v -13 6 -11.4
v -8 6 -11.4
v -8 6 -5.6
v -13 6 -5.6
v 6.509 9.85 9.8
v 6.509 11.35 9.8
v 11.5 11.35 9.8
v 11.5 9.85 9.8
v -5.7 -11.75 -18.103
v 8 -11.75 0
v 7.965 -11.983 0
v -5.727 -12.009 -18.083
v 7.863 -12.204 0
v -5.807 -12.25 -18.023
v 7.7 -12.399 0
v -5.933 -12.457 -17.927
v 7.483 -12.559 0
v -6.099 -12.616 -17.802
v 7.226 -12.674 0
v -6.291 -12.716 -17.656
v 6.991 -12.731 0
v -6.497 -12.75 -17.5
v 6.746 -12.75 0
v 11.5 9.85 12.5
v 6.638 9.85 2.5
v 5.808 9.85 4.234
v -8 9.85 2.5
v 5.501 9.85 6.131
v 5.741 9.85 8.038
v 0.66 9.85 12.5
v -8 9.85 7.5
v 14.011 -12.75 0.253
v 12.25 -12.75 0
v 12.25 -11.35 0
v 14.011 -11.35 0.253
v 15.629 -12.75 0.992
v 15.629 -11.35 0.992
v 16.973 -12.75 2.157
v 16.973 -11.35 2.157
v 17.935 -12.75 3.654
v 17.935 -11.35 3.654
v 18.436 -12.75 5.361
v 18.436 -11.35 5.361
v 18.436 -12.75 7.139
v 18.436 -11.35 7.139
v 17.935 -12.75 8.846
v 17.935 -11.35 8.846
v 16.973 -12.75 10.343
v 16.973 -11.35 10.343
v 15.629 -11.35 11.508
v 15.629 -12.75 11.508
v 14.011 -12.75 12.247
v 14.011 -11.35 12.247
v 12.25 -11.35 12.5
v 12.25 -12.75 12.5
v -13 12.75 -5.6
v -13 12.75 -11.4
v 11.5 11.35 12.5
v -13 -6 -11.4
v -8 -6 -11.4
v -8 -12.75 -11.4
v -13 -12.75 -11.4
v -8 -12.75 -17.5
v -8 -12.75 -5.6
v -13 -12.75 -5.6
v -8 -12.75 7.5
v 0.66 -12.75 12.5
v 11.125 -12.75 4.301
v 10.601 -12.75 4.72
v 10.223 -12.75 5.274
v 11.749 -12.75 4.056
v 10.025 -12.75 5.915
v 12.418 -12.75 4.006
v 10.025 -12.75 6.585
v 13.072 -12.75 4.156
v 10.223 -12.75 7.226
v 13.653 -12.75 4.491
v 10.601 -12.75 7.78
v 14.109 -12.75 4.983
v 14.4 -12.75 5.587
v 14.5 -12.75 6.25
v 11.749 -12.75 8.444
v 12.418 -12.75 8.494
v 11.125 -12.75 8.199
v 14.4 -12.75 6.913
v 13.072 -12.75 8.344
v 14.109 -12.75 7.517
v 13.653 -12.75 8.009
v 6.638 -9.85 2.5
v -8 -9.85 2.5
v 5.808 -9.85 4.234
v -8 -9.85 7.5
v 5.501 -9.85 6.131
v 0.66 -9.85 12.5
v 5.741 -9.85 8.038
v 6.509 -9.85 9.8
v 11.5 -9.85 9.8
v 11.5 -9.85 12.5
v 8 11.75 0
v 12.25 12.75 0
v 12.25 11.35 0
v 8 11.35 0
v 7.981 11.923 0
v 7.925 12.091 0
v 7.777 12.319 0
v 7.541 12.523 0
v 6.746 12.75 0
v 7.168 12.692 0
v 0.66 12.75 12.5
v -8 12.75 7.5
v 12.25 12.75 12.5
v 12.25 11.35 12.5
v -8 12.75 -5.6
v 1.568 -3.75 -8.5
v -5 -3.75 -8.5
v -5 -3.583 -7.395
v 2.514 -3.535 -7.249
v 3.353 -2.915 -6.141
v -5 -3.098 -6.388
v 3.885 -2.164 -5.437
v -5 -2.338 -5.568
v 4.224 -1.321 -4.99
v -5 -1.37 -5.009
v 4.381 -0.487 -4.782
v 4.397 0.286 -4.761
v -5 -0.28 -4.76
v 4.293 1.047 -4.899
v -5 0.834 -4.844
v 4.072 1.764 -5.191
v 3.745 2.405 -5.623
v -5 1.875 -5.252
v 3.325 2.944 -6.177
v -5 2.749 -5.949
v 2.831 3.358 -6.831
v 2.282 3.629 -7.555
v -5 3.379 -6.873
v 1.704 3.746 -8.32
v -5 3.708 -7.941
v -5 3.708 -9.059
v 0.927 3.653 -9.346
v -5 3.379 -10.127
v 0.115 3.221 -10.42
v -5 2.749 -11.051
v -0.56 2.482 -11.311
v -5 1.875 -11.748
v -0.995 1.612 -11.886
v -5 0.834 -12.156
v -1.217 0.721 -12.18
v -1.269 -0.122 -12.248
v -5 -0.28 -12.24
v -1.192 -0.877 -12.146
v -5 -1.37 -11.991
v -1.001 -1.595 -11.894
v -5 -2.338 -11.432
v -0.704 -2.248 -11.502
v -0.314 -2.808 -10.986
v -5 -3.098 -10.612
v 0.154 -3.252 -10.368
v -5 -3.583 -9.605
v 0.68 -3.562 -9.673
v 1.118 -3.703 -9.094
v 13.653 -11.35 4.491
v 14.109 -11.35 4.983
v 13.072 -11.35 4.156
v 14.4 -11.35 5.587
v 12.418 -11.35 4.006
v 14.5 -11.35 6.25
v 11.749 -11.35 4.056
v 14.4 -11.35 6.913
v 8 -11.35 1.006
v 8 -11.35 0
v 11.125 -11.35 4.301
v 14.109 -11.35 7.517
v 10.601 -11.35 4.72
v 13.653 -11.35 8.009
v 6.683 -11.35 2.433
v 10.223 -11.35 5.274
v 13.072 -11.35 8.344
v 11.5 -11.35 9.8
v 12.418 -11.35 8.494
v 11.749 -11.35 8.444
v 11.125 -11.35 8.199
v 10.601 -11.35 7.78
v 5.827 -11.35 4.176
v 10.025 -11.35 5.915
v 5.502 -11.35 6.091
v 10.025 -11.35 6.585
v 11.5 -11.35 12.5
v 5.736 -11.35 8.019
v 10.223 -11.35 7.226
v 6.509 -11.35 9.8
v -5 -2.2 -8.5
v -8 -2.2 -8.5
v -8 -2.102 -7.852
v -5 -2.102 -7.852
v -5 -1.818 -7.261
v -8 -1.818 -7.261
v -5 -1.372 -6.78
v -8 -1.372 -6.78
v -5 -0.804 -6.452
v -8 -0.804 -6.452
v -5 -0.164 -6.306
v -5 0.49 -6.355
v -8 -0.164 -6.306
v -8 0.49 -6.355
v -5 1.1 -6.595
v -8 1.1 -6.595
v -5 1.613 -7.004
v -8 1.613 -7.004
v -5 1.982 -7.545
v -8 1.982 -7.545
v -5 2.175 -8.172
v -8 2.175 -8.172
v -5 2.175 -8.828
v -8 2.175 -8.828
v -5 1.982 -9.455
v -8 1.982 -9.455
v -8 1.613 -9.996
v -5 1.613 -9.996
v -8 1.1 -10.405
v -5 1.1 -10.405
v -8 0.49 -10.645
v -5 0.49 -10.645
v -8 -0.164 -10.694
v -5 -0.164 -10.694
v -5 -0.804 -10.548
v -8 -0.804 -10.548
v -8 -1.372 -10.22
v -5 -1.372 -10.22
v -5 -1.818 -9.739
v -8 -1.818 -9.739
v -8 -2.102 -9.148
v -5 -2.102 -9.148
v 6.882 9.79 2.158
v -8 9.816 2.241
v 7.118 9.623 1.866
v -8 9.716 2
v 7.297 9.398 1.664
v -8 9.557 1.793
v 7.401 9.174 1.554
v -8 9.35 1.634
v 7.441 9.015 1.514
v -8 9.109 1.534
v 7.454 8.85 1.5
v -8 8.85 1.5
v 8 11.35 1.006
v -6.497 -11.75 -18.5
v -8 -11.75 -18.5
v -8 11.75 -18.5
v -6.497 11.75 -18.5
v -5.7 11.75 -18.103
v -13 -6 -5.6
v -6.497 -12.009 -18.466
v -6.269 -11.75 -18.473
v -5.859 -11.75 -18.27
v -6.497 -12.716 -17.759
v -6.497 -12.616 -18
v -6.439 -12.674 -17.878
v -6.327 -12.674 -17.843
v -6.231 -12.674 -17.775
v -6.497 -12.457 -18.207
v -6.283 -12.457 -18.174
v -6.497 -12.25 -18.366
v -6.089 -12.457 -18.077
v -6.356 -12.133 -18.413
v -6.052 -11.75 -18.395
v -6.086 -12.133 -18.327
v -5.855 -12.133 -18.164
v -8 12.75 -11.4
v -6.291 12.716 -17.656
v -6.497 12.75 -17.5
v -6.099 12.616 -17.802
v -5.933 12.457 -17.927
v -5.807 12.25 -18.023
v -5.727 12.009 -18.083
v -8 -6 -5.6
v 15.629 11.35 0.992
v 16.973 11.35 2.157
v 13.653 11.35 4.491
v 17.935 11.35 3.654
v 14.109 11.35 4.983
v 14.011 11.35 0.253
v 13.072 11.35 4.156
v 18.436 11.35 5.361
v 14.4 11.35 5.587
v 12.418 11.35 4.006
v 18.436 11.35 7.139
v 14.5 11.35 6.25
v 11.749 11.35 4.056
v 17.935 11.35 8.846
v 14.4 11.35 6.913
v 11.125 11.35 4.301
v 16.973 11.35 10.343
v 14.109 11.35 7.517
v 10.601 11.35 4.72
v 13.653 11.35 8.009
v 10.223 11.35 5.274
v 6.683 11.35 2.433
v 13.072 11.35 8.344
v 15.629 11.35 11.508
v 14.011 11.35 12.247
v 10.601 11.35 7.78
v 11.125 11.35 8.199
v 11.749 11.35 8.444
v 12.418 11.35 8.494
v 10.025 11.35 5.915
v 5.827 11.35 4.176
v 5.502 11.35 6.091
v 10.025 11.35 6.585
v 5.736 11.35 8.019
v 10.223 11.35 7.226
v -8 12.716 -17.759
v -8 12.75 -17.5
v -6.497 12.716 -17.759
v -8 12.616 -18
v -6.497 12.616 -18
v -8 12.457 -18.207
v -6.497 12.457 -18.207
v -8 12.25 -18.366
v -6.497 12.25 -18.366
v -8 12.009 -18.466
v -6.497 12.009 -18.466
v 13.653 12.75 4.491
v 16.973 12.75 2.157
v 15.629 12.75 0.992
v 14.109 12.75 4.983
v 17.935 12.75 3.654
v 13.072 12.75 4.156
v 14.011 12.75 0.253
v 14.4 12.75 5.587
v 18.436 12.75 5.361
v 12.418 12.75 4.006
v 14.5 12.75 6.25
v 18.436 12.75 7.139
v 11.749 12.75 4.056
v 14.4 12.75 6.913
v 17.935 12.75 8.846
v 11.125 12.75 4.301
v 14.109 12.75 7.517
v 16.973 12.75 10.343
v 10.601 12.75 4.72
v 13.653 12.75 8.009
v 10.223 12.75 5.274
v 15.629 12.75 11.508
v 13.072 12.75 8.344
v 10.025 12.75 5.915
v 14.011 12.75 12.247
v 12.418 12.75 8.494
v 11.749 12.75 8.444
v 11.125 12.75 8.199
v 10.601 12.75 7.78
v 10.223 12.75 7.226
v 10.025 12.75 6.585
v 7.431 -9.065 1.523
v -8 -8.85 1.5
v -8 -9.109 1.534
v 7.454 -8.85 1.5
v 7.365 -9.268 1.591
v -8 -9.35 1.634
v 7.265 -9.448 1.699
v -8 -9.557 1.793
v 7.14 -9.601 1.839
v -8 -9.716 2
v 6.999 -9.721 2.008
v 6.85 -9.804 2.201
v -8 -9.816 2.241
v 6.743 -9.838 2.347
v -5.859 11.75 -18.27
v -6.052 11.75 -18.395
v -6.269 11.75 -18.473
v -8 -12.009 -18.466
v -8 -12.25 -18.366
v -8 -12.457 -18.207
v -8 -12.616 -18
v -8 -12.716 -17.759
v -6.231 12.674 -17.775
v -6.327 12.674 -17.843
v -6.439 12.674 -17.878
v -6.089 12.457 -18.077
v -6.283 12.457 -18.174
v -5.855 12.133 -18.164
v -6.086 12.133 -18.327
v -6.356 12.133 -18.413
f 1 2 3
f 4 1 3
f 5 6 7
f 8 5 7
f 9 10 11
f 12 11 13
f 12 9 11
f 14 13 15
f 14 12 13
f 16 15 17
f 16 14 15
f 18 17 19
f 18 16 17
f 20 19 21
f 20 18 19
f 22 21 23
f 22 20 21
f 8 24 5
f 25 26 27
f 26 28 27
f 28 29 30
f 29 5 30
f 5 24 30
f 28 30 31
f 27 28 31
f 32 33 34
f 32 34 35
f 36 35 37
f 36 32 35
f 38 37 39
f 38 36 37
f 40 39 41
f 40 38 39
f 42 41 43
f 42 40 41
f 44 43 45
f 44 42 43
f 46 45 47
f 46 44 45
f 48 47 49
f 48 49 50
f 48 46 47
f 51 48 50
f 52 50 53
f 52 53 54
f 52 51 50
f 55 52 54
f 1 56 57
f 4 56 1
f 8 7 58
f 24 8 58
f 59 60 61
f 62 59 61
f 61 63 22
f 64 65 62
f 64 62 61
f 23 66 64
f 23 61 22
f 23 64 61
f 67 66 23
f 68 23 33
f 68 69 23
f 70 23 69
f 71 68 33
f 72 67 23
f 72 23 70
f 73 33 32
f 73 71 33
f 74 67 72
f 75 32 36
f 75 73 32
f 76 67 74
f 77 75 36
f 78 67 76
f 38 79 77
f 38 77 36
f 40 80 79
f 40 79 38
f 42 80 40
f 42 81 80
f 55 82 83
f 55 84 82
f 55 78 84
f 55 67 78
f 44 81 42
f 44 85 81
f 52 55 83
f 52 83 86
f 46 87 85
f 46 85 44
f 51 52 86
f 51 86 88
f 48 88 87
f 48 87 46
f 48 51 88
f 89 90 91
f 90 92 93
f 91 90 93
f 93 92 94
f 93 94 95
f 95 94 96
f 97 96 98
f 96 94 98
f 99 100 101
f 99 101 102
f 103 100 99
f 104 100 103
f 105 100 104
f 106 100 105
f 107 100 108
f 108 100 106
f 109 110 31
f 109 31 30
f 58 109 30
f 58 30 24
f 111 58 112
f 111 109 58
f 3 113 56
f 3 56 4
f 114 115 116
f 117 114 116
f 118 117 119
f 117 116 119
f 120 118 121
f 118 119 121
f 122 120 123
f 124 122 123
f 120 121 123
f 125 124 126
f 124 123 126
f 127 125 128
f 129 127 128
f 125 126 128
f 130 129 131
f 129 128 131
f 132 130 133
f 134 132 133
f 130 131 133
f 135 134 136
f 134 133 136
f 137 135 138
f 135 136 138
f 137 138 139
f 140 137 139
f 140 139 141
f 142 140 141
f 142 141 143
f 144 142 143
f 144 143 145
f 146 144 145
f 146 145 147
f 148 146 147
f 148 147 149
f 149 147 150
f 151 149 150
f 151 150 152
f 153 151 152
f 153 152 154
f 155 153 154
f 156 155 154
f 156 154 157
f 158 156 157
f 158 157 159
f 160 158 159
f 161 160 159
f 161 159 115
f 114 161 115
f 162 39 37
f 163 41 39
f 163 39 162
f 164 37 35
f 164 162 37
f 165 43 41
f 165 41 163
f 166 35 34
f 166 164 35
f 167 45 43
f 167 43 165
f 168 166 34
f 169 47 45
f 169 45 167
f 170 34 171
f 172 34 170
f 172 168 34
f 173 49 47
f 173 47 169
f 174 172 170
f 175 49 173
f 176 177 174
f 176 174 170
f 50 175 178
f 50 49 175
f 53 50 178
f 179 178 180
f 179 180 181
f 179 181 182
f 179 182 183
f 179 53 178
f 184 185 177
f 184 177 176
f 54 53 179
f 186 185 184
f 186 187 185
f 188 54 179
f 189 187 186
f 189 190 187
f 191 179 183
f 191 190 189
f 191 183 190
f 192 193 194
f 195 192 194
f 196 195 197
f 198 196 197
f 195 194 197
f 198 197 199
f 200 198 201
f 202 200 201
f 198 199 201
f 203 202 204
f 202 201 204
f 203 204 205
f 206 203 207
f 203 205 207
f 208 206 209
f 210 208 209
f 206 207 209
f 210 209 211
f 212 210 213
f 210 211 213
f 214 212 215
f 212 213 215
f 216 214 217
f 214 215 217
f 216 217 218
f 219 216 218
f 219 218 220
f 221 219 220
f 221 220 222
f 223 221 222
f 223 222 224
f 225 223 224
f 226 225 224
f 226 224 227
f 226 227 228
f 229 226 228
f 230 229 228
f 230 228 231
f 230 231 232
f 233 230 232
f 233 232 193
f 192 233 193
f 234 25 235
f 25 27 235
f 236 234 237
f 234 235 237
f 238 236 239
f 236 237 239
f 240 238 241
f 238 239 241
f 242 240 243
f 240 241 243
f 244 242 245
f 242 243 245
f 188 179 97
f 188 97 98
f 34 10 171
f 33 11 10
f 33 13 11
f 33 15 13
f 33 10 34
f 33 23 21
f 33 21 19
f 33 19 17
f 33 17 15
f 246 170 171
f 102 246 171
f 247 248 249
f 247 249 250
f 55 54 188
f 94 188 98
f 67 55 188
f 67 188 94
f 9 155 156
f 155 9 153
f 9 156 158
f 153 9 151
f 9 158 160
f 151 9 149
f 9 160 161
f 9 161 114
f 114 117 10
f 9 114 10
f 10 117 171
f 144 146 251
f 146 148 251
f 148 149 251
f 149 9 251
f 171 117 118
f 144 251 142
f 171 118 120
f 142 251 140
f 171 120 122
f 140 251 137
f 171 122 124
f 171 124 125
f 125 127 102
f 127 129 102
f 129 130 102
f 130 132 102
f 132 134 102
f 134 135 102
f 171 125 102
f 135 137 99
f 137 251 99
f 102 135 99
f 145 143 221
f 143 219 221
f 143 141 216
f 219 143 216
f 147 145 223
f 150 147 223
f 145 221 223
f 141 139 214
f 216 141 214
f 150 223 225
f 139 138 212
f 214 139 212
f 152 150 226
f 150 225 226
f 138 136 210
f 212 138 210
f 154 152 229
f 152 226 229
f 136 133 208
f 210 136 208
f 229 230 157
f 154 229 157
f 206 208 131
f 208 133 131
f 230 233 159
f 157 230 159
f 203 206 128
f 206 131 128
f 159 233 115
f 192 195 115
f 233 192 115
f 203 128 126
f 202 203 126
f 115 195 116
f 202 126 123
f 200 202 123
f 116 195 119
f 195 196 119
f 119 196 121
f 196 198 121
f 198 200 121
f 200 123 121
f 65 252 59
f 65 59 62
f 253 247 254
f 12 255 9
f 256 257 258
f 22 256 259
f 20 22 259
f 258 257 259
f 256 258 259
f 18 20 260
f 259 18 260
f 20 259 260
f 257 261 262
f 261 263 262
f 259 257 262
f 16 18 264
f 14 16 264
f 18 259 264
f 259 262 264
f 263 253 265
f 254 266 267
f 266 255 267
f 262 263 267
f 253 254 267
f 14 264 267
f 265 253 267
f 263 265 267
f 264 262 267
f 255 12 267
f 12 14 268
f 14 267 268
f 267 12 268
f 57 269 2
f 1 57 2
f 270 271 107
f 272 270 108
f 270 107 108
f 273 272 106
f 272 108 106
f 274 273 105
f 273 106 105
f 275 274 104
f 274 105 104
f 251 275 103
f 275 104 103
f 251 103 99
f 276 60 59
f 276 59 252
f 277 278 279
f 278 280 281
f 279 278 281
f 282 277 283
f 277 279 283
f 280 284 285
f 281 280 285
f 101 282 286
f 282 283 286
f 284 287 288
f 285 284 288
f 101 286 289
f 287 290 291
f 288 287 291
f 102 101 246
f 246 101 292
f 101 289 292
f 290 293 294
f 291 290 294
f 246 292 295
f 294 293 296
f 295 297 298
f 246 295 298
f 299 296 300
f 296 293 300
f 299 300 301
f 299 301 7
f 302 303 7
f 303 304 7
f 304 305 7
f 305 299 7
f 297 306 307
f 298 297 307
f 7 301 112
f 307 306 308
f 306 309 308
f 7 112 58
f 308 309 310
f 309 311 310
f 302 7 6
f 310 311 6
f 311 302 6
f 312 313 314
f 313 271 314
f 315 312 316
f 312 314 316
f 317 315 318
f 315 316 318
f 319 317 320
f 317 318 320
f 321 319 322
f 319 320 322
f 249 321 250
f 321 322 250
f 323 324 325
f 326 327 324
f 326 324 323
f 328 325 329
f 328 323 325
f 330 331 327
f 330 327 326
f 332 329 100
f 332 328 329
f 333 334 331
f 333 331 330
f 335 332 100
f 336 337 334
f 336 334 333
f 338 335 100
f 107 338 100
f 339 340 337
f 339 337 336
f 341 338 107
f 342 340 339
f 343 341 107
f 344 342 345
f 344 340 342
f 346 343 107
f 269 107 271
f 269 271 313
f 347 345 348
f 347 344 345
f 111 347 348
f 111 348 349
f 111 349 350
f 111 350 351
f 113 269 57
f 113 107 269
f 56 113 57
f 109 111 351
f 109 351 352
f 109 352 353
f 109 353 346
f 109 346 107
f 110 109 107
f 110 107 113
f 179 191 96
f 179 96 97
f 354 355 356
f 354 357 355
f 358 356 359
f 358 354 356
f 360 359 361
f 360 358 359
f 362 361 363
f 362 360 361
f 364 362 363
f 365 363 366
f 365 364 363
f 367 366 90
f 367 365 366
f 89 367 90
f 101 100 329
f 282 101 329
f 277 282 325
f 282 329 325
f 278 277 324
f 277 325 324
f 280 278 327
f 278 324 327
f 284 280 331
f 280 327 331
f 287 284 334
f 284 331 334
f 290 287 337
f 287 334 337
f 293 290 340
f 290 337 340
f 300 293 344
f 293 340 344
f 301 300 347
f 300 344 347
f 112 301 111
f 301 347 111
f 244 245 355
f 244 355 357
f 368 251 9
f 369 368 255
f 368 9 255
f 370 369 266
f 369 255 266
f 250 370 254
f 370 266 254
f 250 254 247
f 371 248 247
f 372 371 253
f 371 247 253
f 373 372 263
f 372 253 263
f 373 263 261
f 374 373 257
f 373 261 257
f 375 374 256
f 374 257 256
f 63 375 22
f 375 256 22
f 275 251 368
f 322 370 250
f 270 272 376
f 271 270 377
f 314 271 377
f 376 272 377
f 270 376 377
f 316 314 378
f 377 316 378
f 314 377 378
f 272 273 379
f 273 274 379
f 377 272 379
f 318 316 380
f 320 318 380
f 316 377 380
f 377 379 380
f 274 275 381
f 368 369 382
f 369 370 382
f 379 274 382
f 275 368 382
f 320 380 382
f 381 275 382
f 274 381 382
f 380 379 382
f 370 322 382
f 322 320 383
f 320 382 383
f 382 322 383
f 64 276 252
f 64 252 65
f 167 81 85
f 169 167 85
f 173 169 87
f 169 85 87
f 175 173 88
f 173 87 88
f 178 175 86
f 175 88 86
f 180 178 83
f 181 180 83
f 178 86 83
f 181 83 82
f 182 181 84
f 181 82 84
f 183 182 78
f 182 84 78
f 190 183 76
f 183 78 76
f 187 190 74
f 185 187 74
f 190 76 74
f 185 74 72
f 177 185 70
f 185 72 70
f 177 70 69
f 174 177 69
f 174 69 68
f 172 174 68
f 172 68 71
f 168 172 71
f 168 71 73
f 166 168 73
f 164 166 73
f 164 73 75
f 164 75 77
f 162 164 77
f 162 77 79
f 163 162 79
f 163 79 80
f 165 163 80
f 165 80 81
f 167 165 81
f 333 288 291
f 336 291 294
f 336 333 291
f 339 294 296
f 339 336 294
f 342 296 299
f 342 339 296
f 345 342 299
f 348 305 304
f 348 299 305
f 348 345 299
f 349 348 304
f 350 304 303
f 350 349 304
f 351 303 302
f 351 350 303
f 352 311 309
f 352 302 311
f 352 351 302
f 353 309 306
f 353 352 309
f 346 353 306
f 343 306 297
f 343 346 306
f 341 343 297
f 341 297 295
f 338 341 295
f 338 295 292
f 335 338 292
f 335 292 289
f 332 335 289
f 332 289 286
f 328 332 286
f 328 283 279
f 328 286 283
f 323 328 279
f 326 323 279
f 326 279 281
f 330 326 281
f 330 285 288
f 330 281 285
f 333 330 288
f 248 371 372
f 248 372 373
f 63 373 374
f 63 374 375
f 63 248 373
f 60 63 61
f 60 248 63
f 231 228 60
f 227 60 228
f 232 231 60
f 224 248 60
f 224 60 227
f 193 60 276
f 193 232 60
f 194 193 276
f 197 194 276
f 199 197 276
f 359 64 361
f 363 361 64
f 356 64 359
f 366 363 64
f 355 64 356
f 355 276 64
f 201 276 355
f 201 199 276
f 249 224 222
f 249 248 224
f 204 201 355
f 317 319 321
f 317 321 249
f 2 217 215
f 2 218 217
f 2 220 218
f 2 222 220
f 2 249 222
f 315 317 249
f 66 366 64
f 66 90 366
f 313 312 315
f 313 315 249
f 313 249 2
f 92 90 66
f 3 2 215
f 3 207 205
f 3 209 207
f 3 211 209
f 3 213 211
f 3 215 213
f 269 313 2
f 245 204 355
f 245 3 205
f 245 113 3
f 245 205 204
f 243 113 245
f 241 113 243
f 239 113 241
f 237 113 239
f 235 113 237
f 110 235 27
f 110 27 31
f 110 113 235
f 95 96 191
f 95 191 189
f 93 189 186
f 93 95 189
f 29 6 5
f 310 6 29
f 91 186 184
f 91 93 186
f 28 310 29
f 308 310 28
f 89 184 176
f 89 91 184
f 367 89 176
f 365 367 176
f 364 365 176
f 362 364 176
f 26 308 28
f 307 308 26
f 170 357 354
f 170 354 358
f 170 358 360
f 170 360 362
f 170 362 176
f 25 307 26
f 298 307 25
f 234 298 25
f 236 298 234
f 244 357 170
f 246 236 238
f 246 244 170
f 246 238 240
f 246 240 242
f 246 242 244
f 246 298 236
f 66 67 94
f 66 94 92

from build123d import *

# Parameters (mm, degrees)
SKETCH009_W          = 16
SKETCH009_H          = 25.5
PAD003_DEPTH         = 1.5
PAD003_DEPTH_BACK    = 18.5
POCKET006_DEPTH      = 12.751
POCKET006_DEPTH_BACK = 12.751
SKETCH010_R          = 2.25
PAD004_DEPTH         = 2.9
SKETCH011_R          = 2.25
PAD005_DEPTH         = 2.9
POCKET002_DEPTH      = 11.35
POCKET003_DEPTH      = 11.35
SKETCH015_R          = 2.2
POCKET004_DEPTH      = 26.501032
SKETCH016_R          = 3.75
POCKET005_DEPTH      = 23.501032
SKETCH017_W          = 6.75
SKETCH017_H          = 5.8
PAD006_DEPTH         = 5
FILLET001_R          = 1


with BuildPart() as part:
    # Sketch009 → Pad003 (new body, two sides)
    with BuildSketch(Plane.XY) as pad003_sk:
        Rectangle(SKETCH009_W, SKETCH009_H)
    extrude(amount=PAD003_DEPTH)
    extrude(pad003_sk.sketch, amount=-PAD003_DEPTH_BACK)

    # Sketch018 → Pocket006 (cut, two sides)
    with BuildSketch(Plane.XZ) as pocket006_sk:
        Polygon((-6, -18.5), (8, 0), (8, -18.5), align=None)
    extrude(amount=-POCKET006_DEPTH, mode=Mode.SUBTRACT)
    extrude(pocket006_sk.sketch, amount=POCKET006_DEPTH_BACK, mode=Mode.SUBTRACT)

    # Sketch010 → Pad004 (join)
    with BuildSketch(Plane.XZ.offset(12.75)):
        with BuildLine():
            ThreePointArc((12.25, 0), (18.500032, 6.25), (12.25, 12.5))
            Line((12.25, 12.5), (0.660254, 12.5))
            Line((0.660254, 12.5), (-8, 7.5))
            Line((-8, 7.5), (-8, 0))
            Line((-8, 0), (12.25, 0))
        make_face()
        with Locations((12.25, 6.25)):
            Circle(SKETCH010_R, mode=Mode.SUBTRACT)
    extrude(amount=-PAD004_DEPTH)

    # Sketch011 → Pad005 (join)
    with BuildSketch(Plane.XZ.offset(-12.75)):
        with BuildLine():
            Line((12.25, 0), (-8, 0))
            Line((-8, 0), (-8, 7.5))
            Line((-8, 7.5), (0.660254, 12.5))
            Line((0.660254, 12.5), (12.25, 12.5))
            ThreePointArc((12.25, 0), (18.500019, 6.25), (12.25, 12.5))
        make_face()
        with Locations((12.25, 6.25)):
            Circle(SKETCH011_R, mode=Mode.SUBTRACT)
    extrude(amount=PAD005_DEPTH)

    # Sketch012 → Pocket002 (cut)
    with BuildSketch(Plane.XZ.offset(11.35)):
        with BuildLine():
            Line((18.6, 12.5), (18.6, 0))
            Line((8, 0), (18.6, 0))
            Line((8, 1.005956), (8, 0))
            ThreePointArc((6.50892, 9.8), (5.594985, 5.121605), (8, 1.005956))
            Line((6.50892, 9.8), (11.5, 9.8))
            Line((11.5, 9.8), (11.5, 12.5))
            Line((11.5, 12.5), (18.6, 12.5))
        make_face()
    extrude(amount=-POCKET002_DEPTH, mode=Mode.SUBTRACT)

    # Sketch013 → Pocket003 (cut)
    with BuildSketch(Plane.XZ.offset(-11.35)):
        with BuildLine():
            Line((18.6, 12.5), (18.6, 0))
            Line((8, 0), (18.6, 0))
            Line((8, 1.005956), (8, 0))
            ThreePointArc((6.50892, 9.8), (5.594985, 5.121605), (8, 1.005956))
            Line((6.50892, 9.8), (11.5, 9.8))
            Line((11.5, 9.8), (11.5, 12.5))
            Line((11.5, 12.5), (18.6, 12.5))
        make_face()
    extrude(amount=POCKET003_DEPTH, mode=Mode.SUBTRACT)

    # Sketch015 (on DatumPlane) → Pocket004 (cut, through all)
    with BuildSketch(Plane(origin=(-8, 12.75, 0), x_dir=(0, -1, 0), z_dir=(-1, 0, 0))):
        with Locations((12.75, -8.5)):
            Circle(SKETCH015_R)
    extrude(amount=-POCKET004_DEPTH, mode=Mode.SUBTRACT)

    # Sketch016 (on DatumPlane) → Pocket005 (cut, through all)
    with BuildSketch(Plane(origin=(-5, 12.75, 0), x_dir=(0, -1, 0), z_dir=(-1, 0, 0))):
        with Locations((12.75, -8.5)):
            Circle(SKETCH016_R)
    extrude(amount=-POCKET005_DEPTH, mode=Mode.SUBTRACT)

    # Sketch017 (on DatumPlane) → Pad006 (join)
    with BuildSketch(Plane(origin=(-8, 12.75, 0), x_dir=(0, -1, 0), z_dir=(-1, 0, 0))):
        with Locations((3.375, -8.5)):
            Rectangle(SKETCH017_W, SKETCH017_H)
        with Locations((22.125, -8.5)):
            Rectangle(SKETCH017_W, SKETCH017_H)
    extrude(amount=PAD006_DEPTH)

    # Fillet001
    fillet001_edges = [part.edges().sort_by_distance(p)[0] for p in [
        (1, -12.75, -9.25),
        (1, 12.75, -9.25),
        (-7, 12.75, -18.5),
        (-6, 0, -18.5),
        (-7, -12.75, -18.5),
        (-0.272916, -9.85, 1.5),
        (-0.272916, 9.85, 1.5),
    ]]
    fillet(fillet001_edges, radius=FILLET001_R)


solid = part.part
